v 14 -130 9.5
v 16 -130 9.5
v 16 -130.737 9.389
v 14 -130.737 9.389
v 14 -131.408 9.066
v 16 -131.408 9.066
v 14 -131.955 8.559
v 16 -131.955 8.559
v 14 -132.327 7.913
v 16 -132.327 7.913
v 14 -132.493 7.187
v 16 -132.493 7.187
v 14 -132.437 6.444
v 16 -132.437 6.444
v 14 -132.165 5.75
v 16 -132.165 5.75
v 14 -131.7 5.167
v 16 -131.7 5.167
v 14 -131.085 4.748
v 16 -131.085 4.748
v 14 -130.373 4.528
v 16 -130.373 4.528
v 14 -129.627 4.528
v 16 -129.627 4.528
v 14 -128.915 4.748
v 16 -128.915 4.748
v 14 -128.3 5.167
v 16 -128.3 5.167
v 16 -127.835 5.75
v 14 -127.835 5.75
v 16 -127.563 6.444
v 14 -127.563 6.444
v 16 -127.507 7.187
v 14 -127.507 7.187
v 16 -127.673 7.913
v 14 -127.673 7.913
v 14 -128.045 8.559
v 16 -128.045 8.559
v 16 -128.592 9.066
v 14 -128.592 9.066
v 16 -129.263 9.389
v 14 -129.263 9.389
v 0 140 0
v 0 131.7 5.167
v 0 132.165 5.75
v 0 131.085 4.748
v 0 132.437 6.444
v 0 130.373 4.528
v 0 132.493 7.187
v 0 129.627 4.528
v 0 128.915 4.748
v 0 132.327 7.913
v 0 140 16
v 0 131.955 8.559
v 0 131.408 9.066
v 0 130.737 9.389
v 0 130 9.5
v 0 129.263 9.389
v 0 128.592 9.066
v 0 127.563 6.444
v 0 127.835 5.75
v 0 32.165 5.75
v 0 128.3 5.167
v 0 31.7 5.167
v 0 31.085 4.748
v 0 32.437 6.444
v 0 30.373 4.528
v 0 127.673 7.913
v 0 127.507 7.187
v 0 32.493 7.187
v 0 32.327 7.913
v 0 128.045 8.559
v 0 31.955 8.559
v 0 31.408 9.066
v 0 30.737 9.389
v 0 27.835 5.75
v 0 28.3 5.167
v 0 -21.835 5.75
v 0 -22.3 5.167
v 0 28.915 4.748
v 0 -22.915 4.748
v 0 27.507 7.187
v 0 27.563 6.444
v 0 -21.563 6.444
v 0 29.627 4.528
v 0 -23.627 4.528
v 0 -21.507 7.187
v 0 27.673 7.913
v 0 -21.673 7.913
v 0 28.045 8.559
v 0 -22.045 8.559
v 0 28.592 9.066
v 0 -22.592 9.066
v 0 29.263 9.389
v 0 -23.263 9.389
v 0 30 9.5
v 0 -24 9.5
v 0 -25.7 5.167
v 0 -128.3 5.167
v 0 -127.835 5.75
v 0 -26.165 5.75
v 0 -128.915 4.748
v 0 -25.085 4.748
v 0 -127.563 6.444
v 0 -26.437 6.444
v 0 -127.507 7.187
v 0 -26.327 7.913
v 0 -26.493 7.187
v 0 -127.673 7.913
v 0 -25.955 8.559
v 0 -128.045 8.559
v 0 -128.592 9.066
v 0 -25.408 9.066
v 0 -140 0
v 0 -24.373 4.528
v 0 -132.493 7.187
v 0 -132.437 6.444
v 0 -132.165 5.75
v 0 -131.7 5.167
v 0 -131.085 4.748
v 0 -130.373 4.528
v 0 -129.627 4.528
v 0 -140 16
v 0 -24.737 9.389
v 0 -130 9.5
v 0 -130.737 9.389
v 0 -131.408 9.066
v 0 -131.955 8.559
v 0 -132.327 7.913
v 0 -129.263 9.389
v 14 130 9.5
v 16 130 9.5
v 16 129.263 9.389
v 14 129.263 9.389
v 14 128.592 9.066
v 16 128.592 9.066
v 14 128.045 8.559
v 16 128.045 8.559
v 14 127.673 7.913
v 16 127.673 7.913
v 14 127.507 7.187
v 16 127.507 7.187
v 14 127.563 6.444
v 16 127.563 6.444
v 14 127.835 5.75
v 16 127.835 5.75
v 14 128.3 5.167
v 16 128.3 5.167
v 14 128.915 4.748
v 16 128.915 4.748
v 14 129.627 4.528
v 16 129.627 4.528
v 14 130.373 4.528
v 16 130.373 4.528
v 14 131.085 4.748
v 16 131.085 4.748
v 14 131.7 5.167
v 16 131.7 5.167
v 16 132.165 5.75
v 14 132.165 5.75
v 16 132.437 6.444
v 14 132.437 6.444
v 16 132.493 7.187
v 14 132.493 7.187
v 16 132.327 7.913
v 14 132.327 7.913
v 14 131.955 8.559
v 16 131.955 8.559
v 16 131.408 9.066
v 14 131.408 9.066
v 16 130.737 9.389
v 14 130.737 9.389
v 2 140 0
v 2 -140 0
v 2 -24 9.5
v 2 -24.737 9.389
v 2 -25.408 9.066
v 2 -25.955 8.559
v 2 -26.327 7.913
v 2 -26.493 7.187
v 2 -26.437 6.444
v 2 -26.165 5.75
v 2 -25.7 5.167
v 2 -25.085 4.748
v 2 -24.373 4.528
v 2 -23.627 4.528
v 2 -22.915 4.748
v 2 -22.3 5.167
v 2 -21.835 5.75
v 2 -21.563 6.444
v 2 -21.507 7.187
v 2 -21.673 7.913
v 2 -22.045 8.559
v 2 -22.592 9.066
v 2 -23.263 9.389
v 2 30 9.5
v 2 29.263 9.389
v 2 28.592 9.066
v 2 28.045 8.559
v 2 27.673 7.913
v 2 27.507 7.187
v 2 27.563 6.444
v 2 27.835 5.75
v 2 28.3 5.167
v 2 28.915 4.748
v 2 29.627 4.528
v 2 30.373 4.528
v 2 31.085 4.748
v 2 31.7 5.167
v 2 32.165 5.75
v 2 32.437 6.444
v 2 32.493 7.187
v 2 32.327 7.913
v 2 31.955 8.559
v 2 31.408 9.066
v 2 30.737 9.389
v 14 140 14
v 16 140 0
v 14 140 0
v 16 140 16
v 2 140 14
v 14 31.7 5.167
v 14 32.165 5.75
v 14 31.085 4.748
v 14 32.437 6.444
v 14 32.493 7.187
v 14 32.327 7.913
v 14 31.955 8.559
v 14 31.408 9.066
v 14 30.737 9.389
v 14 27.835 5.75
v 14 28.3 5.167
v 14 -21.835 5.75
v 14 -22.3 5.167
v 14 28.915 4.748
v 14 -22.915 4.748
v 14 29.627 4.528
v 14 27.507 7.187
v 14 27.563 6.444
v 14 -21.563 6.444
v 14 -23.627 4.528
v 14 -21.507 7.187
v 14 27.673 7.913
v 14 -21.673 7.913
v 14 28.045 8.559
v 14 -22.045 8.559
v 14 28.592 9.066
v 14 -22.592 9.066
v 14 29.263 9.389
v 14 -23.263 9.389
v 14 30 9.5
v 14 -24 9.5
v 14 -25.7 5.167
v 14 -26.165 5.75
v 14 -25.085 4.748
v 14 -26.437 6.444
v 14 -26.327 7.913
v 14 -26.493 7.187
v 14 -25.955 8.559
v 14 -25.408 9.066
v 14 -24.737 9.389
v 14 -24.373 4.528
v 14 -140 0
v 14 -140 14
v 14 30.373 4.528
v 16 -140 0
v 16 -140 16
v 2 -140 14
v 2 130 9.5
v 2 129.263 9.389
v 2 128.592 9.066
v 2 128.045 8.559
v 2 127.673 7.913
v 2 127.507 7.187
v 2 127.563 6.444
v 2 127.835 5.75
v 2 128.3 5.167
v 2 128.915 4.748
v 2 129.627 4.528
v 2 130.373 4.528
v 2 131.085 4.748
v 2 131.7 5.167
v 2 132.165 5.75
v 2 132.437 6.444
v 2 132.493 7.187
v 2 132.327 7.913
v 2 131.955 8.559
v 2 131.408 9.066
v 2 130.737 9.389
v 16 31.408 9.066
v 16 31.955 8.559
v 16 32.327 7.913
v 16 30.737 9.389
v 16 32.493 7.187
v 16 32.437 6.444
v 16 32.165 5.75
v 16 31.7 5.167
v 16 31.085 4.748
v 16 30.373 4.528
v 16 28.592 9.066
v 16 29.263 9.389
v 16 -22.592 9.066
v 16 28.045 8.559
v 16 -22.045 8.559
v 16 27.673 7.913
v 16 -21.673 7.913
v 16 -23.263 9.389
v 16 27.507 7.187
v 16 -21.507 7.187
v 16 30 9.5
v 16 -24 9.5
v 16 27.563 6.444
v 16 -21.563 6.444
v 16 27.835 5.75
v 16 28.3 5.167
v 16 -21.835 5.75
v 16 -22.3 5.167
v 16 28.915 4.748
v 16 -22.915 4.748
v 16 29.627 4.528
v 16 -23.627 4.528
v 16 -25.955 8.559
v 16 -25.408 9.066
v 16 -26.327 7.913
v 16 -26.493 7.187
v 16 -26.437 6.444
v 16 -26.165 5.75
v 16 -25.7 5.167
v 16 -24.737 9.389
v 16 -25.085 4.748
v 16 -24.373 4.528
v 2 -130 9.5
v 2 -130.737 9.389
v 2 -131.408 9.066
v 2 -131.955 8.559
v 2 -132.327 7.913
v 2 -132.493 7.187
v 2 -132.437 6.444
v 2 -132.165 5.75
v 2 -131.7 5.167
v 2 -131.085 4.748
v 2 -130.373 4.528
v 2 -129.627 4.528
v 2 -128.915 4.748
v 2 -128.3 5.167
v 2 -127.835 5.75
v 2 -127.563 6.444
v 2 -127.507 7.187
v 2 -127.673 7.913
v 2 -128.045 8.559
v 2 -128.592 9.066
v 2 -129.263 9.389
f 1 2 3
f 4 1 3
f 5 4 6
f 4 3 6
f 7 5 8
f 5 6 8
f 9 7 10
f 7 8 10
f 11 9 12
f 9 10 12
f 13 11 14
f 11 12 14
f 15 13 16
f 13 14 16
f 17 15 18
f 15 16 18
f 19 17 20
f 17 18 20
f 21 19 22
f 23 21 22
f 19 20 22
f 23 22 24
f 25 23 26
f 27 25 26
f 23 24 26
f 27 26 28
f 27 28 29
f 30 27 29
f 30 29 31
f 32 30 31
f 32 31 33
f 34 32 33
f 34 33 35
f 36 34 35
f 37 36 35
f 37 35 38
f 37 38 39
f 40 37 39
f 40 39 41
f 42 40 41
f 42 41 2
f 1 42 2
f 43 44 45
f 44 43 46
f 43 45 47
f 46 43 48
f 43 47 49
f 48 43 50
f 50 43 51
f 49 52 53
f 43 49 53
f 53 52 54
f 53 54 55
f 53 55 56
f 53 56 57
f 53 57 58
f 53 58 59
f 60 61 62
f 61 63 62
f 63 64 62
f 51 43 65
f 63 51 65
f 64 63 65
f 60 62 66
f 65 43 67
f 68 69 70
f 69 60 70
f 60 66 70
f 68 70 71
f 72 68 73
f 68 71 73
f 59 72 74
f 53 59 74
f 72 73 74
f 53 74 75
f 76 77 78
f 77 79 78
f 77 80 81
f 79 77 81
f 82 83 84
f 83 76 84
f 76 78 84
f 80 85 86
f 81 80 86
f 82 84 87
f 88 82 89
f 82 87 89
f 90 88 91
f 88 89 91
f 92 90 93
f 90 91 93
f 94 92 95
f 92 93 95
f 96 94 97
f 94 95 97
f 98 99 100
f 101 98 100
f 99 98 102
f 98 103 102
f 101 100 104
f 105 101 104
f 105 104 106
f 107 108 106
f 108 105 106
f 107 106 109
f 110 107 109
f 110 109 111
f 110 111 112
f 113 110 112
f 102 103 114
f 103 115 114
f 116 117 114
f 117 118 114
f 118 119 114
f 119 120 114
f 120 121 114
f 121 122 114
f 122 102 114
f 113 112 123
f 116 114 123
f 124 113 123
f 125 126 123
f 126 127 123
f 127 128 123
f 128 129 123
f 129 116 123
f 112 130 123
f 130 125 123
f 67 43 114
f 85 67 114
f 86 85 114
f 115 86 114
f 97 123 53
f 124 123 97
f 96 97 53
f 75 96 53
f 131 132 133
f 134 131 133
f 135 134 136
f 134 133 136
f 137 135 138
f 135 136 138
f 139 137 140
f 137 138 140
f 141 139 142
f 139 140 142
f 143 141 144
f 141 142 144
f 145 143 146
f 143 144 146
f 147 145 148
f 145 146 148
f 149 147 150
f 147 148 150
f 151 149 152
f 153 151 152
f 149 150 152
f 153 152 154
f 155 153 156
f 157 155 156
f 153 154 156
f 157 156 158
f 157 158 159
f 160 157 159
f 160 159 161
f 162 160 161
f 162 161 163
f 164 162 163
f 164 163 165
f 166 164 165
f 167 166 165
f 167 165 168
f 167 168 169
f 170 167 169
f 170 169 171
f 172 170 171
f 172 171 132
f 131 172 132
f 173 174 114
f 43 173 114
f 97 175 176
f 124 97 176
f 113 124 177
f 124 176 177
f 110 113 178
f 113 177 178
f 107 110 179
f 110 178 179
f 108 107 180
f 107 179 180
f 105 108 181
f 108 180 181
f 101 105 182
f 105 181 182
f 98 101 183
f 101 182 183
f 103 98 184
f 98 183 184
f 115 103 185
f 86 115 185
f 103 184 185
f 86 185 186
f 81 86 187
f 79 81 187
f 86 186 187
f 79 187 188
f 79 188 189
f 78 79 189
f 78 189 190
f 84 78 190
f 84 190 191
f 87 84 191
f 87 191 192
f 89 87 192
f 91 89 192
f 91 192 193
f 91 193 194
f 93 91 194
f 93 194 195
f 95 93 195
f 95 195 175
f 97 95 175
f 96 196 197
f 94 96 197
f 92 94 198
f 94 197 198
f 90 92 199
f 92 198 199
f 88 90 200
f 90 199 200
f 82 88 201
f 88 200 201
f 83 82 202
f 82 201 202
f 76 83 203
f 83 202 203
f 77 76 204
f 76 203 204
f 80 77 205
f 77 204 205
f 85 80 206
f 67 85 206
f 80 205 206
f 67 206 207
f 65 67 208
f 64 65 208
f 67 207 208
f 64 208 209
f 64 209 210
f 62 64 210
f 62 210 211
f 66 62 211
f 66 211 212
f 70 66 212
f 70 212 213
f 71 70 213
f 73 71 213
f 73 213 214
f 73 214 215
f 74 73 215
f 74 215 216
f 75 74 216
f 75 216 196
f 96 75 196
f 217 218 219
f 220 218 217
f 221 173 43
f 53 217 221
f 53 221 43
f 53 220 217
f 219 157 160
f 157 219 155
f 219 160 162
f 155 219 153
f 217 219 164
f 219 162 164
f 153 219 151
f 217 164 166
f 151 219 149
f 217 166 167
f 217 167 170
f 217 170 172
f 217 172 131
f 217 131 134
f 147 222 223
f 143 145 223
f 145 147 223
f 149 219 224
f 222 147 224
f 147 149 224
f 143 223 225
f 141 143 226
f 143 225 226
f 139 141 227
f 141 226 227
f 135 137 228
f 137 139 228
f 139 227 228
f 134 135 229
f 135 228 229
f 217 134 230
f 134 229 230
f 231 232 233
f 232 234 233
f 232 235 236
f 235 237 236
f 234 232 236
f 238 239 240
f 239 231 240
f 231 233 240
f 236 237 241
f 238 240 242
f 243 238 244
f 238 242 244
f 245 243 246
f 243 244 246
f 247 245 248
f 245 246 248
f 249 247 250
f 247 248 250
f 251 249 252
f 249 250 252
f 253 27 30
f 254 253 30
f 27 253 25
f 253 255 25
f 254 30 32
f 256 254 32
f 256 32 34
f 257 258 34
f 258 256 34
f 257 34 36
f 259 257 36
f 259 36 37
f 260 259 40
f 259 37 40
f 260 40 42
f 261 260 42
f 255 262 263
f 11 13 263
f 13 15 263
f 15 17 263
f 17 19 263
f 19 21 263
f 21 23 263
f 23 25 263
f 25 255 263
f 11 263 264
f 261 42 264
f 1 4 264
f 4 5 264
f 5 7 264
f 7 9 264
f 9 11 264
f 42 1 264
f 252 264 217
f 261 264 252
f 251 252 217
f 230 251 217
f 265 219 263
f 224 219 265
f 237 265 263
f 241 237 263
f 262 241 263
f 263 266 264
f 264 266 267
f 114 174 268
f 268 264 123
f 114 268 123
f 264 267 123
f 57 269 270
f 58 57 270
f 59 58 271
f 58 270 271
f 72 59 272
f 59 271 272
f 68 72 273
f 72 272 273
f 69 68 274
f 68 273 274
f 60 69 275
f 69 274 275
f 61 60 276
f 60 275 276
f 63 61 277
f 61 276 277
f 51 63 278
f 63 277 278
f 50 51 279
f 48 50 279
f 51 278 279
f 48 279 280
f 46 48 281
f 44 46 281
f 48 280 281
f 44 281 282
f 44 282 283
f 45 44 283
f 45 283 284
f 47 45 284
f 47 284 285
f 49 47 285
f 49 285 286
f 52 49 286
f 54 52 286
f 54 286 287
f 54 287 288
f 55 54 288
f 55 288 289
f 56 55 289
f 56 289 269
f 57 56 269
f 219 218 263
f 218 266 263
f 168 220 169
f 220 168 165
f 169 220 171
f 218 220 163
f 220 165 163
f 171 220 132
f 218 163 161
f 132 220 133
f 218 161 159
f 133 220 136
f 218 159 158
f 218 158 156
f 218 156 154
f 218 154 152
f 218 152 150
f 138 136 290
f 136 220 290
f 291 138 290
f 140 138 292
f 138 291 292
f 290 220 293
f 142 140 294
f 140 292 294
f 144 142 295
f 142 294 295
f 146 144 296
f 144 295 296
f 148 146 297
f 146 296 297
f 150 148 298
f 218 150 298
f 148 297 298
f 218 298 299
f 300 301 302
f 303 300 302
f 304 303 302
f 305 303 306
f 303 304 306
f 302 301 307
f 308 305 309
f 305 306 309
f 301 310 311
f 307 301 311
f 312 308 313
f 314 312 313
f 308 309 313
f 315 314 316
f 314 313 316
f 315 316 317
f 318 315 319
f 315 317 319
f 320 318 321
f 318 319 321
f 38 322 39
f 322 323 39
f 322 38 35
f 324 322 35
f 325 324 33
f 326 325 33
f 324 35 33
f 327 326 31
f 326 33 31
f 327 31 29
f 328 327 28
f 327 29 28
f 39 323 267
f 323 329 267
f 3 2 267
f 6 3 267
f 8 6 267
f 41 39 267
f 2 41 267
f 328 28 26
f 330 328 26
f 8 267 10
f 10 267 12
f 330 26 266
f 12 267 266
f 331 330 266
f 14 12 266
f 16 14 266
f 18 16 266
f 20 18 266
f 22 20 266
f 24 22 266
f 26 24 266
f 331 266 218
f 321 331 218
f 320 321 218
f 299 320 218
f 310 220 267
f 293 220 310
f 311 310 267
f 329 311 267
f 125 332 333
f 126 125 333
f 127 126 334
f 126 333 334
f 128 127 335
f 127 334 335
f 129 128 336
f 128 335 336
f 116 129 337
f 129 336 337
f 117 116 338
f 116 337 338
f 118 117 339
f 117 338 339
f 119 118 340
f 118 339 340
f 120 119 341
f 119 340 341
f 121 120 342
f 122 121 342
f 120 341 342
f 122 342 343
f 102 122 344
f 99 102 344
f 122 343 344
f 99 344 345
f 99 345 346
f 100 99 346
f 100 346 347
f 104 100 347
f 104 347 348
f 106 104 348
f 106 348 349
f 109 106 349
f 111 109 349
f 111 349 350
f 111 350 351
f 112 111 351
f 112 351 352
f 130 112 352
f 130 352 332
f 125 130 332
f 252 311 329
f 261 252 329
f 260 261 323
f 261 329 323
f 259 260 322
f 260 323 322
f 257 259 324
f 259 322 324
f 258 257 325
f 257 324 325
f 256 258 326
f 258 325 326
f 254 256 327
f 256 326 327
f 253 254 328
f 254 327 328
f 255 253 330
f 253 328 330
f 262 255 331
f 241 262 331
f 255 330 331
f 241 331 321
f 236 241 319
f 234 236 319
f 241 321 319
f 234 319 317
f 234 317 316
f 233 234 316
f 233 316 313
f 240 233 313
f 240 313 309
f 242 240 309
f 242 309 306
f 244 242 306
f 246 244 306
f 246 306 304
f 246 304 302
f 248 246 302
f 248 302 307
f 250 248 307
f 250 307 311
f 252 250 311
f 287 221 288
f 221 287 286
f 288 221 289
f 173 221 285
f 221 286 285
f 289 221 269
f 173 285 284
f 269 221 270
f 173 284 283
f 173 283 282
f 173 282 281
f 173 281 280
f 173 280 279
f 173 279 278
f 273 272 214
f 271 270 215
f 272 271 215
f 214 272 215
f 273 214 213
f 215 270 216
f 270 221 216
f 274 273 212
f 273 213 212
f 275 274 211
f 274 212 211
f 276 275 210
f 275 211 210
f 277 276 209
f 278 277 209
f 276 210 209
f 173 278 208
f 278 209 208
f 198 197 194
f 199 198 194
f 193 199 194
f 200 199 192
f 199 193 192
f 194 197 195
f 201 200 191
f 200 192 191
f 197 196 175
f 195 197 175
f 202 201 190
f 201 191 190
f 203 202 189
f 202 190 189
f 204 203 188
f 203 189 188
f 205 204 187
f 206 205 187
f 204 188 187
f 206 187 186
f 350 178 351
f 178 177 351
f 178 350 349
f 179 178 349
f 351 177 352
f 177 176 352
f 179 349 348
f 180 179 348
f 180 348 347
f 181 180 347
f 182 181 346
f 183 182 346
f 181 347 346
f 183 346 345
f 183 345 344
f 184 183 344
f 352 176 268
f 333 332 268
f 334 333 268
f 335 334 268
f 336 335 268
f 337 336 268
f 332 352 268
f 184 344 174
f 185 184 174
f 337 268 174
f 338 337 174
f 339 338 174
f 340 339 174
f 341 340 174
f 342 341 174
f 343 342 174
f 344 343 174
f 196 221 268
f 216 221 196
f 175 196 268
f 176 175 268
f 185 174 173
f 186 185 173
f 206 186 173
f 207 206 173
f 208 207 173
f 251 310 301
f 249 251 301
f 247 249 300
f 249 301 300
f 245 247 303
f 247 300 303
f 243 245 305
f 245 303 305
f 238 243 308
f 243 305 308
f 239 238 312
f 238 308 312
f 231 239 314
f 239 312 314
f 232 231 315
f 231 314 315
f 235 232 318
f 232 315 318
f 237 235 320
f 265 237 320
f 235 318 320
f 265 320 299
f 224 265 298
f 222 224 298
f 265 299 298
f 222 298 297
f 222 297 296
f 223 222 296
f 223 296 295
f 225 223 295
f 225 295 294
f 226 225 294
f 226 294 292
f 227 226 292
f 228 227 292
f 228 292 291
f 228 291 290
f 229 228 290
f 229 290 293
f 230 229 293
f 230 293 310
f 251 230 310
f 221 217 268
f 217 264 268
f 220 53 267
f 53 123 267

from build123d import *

# Parameters (mm, degrees)
PAD_DEPTH    = 140
SKETCH001_R  = 2.5
POCKET_DEPTH = 16.001


with BuildPart() as part:
    # Sketch → Pad (new body, symmetric)
    with BuildSketch(Plane.XZ):
        Polygon((0, 0), (0, 16), (16, 16), (16, 0), (14, 0), (14, 14), (2, 14), (2, 0), align=None)
    extrude(amount=PAD_DEPTH, both=True)

    # Sketch001 → Pocket (cut, through all)
    with BuildSketch(Plane(origin=(16, 0, 0), x_dir=(0, 0, 1), z_dir=(1, 0, 0))):
        with Locations((7, 130)):
            Circle(SKETCH001_R)
        with Locations((7, -130)):
            Circle(SKETCH001_R)
        with Locations((7, 24)):
            Circle(SKETCH001_R)
        with Locations((7, -30)):
            Circle(SKETCH001_R)
    extrude(amount=-POCKET_DEPTH, mode=Mode.SUBTRACT)


solid = part.part
